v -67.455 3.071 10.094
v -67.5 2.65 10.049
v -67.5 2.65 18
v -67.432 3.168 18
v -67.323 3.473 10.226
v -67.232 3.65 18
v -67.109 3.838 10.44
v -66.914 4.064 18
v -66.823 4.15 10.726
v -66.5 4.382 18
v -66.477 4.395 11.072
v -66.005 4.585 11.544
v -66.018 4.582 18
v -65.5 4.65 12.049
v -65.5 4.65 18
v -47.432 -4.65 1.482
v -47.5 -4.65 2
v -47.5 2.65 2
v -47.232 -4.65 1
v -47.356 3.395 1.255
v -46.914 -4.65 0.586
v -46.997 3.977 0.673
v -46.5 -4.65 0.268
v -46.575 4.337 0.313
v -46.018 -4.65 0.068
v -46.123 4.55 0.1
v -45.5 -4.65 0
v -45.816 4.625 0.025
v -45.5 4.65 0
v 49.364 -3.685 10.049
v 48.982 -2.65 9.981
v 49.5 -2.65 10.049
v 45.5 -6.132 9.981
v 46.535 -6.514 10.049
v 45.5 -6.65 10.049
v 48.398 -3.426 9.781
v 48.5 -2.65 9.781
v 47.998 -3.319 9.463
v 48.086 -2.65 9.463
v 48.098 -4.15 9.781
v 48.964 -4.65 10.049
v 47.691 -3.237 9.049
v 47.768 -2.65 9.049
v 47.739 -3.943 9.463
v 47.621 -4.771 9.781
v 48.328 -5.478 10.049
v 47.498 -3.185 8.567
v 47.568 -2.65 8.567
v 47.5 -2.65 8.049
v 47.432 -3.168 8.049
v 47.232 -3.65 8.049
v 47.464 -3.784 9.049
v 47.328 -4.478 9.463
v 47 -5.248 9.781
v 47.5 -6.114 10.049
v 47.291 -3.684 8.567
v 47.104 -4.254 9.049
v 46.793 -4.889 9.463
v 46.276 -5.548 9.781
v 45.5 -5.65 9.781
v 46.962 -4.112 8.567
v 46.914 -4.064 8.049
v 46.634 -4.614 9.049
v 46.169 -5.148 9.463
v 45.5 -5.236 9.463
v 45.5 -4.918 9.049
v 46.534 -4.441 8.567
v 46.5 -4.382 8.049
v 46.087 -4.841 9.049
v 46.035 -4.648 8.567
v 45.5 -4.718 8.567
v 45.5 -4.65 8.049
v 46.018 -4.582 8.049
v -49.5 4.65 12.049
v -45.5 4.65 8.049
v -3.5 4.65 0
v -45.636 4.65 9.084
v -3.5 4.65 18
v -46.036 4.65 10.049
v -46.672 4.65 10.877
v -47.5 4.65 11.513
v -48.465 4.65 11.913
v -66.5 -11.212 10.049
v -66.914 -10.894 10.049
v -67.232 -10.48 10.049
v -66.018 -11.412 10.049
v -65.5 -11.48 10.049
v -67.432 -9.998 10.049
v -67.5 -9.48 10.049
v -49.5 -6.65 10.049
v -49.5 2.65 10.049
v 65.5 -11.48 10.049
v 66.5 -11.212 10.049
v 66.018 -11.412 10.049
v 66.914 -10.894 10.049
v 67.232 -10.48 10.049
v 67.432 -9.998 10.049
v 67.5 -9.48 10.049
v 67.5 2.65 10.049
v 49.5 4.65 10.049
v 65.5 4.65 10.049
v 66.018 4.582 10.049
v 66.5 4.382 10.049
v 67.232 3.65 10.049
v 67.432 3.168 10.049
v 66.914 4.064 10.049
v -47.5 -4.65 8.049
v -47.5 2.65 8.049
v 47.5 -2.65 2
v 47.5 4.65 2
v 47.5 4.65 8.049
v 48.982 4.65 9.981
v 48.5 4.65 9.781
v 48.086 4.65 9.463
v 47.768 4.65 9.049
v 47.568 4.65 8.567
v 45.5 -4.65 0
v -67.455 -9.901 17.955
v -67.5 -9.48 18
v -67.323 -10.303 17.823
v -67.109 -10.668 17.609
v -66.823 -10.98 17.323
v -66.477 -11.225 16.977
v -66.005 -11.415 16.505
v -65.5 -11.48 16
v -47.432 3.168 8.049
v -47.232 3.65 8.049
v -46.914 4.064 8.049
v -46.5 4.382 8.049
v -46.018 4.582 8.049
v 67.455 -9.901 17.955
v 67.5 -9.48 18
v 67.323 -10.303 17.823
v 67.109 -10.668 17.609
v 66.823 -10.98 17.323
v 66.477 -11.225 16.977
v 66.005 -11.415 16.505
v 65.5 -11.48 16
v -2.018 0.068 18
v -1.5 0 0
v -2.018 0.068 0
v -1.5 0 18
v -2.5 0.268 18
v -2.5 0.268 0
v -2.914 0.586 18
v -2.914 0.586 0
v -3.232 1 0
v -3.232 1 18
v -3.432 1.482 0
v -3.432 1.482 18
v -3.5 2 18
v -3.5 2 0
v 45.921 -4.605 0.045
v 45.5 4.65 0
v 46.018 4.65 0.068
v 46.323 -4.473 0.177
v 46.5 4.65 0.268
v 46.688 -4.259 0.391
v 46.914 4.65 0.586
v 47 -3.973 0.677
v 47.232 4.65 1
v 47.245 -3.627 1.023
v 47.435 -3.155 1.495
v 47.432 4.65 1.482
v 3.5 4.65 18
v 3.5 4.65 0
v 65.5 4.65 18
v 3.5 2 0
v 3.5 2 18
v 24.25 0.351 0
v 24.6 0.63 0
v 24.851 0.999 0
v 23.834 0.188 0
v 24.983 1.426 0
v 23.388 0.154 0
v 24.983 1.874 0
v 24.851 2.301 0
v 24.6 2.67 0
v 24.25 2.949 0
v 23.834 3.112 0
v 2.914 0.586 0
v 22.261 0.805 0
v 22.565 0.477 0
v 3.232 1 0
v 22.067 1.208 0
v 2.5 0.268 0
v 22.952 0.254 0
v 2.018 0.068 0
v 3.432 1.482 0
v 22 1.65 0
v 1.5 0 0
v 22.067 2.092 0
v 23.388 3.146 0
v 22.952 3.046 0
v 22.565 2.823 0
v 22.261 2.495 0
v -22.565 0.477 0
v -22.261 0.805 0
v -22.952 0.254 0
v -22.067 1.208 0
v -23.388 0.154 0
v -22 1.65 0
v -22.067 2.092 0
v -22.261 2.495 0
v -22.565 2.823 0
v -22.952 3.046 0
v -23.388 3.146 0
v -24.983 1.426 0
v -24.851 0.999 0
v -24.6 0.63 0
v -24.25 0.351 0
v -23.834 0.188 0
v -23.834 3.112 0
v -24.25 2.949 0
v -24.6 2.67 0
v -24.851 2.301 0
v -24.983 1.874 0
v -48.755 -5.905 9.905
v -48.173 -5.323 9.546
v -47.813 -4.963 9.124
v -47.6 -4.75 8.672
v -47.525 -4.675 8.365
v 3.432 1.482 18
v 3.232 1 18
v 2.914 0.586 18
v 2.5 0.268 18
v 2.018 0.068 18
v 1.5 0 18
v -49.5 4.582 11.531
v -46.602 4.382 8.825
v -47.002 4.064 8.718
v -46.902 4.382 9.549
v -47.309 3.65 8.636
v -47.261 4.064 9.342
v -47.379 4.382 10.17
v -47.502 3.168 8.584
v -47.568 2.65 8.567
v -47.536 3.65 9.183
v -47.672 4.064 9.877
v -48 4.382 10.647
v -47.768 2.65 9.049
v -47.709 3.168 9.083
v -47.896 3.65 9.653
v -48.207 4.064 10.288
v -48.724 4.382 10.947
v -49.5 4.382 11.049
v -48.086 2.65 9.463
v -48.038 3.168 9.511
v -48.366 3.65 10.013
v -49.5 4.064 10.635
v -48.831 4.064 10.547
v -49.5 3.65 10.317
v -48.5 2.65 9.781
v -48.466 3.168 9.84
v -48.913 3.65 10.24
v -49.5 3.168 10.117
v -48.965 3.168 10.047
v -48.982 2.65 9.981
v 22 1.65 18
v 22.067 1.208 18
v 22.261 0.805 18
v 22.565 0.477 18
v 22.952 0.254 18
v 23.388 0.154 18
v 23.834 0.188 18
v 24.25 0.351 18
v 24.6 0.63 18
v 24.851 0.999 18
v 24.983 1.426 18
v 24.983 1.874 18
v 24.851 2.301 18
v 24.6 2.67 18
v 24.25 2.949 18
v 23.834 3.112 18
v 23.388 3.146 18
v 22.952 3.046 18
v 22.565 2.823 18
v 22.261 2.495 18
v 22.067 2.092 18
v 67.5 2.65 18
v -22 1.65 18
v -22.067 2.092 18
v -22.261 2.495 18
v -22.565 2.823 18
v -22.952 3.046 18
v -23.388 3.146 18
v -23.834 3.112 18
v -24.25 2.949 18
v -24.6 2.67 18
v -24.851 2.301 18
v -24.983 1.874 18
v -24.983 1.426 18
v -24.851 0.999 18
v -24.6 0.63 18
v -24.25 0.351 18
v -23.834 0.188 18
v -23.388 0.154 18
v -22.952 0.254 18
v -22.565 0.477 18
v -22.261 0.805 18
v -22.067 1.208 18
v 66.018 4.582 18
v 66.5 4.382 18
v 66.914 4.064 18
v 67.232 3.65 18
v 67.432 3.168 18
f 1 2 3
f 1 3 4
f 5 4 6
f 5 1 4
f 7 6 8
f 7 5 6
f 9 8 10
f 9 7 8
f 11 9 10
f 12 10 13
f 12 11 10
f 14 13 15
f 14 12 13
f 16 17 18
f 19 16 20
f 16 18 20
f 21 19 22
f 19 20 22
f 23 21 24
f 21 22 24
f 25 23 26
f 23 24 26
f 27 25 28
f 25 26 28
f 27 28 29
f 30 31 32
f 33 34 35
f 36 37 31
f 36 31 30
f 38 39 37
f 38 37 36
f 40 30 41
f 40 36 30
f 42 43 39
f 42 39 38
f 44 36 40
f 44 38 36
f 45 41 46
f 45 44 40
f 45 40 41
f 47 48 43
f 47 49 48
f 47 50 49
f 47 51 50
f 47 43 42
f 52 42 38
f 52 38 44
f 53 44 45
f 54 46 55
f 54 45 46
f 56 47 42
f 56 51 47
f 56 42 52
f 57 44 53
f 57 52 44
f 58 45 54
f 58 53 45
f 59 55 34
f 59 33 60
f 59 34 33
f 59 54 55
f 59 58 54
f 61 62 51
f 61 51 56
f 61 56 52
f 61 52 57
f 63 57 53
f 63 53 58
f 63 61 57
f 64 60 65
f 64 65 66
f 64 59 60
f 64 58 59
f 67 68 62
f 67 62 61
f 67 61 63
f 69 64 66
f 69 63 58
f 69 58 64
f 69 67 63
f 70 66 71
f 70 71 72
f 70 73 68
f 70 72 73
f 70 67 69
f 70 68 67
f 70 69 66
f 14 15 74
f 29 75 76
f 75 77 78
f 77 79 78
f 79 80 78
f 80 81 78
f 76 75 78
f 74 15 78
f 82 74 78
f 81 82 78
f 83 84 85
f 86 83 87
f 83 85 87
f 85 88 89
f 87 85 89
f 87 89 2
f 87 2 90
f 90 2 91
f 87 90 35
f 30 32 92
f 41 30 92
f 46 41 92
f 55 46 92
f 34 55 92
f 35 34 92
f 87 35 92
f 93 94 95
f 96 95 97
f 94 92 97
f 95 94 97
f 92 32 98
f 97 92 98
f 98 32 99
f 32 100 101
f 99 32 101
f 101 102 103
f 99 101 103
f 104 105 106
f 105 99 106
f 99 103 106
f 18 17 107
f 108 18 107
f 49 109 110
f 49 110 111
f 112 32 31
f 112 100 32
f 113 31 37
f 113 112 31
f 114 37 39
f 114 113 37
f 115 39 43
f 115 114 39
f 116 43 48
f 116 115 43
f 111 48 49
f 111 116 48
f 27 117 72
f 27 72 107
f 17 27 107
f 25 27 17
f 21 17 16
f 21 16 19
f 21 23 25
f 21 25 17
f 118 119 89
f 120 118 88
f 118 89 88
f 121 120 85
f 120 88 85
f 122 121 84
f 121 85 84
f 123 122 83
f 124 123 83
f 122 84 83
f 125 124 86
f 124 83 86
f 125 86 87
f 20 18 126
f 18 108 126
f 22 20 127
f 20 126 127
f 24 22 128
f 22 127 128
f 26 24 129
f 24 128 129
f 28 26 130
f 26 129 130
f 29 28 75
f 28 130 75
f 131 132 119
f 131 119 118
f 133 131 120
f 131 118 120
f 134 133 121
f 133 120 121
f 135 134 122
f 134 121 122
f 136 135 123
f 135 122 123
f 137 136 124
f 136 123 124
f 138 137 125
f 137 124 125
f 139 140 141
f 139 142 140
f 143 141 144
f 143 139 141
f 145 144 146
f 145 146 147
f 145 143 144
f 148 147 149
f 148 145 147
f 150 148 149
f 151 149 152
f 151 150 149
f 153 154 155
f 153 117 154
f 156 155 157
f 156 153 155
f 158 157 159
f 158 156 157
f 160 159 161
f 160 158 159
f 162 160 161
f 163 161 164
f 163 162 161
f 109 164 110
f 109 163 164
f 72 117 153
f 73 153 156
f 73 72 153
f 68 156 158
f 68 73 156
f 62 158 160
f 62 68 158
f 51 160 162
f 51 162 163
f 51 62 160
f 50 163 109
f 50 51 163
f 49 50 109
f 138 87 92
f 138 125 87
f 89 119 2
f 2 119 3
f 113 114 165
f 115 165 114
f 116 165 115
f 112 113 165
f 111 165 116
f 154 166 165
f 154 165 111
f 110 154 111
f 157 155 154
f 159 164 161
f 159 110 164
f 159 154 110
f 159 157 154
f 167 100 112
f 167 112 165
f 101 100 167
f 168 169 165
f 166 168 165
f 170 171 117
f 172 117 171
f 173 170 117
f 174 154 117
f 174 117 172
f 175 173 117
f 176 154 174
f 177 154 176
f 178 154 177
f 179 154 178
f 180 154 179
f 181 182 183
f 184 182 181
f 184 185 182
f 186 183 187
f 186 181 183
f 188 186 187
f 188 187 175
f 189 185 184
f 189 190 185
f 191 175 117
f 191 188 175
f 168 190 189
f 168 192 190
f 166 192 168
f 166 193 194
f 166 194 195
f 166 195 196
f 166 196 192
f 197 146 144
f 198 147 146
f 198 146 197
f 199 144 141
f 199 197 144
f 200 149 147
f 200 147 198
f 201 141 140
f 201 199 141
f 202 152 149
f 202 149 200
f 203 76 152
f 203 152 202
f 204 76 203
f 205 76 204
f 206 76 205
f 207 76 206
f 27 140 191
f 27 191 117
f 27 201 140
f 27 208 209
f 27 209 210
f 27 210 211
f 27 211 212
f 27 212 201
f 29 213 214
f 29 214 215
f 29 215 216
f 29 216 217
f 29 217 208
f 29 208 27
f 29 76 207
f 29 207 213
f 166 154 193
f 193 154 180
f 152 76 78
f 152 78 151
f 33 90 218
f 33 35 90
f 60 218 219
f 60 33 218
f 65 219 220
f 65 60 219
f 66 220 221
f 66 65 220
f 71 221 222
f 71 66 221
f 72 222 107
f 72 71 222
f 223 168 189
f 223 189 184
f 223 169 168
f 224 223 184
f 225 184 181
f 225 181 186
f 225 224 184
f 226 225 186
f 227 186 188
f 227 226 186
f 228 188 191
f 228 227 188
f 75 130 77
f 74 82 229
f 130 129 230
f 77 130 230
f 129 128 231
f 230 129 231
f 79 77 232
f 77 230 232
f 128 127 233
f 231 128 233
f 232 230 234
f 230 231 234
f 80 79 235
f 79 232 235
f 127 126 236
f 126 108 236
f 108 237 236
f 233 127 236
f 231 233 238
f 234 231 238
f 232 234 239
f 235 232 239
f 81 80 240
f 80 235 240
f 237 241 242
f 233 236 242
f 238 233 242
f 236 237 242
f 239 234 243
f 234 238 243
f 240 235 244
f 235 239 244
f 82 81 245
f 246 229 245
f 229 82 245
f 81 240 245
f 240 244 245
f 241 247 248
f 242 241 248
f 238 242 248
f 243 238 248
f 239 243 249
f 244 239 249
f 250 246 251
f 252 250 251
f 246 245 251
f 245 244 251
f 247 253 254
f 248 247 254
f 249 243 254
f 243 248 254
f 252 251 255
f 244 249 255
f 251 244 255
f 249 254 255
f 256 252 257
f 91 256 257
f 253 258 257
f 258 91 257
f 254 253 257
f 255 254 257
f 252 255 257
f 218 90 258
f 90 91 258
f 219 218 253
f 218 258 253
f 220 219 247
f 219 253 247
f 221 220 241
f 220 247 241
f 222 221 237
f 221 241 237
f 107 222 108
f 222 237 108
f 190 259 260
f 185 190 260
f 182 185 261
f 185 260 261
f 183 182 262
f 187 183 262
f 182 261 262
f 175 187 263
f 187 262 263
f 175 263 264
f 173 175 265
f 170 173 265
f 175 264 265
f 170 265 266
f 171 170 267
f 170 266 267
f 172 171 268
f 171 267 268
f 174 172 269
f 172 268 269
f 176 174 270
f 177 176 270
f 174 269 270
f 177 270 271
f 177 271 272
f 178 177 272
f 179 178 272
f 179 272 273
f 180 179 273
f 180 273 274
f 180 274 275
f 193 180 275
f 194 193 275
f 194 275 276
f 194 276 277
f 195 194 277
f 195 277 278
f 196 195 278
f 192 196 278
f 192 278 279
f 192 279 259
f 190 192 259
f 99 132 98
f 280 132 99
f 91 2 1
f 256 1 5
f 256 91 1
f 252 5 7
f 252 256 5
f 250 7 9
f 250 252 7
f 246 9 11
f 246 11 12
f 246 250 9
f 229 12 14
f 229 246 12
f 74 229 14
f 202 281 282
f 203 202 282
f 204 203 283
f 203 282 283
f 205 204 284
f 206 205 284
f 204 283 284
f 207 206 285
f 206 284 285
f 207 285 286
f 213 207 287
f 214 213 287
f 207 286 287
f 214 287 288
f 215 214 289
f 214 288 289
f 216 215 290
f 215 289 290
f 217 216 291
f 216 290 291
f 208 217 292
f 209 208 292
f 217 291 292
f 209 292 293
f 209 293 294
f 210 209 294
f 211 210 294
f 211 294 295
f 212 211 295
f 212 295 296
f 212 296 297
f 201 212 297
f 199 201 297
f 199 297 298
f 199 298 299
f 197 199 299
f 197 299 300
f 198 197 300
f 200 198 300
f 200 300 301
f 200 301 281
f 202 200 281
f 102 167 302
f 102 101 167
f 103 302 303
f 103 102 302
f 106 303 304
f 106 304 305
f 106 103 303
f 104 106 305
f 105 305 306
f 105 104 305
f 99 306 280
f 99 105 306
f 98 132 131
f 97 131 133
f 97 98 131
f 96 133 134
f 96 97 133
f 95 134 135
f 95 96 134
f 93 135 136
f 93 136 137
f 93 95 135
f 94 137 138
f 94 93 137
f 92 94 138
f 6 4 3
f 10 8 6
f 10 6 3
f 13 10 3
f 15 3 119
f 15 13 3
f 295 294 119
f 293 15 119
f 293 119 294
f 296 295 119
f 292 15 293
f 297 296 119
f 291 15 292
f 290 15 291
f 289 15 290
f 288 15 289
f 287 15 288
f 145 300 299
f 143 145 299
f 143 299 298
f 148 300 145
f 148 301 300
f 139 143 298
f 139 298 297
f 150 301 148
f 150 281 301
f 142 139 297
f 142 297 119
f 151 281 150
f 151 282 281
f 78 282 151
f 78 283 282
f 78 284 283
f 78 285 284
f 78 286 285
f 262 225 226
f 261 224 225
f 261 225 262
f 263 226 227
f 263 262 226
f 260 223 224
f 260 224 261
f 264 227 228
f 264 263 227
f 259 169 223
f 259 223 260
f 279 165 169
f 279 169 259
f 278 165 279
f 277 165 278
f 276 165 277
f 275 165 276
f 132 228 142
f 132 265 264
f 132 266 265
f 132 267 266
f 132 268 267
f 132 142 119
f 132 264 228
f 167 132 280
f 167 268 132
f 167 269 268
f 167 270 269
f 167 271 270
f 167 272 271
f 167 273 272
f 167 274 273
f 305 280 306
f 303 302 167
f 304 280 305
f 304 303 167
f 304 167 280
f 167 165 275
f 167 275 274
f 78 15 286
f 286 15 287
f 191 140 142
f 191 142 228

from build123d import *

# Parameters (mm, degrees)
BOSS_EXTRU_1_DEPTH      = 18
ESQUISSE2_R             = 1.5
ENL_V_MAT_EXTRU_1_DEPTH = 52.008553204
ESQUISSE3_W             = 7.950993182
ESQUISSE3_H             = 6.830138408
BOSS_EXTRU_2_DEPTH      = 95
ESQUISSE4_W             = 20
ESQUISSE4_H             = 16.130138408
BOSS_EXTRU_3_DEPTH      = 7.950993182
CONG_1_R                = 2


with BuildPart() as part:
    # Esquisse1 → Boss.-Extru.1 (new body)
    with BuildSketch(Plane.XY):
        Polygon((-47.5, 4.65), (-3.5, 4.65), (-3.5, 0), (3.5, 0), (3.5, 4.65), (47.5, 4.65), (47.5, -4.65), (-47.5, -4.65), align=None)
    extrude(amount=BOSS_EXTRU_1_DEPTH)

    # Esquisse2 → Enlèv. mat.-Extru.1 (cut, through all)
    with BuildSketch(Plane.XY.offset(18)):
        with Locations((-23.5, 1.65)):
            Circle(ESQUISSE2_R)
        with Locations(Location((23.5, 1.65, 0), (0, 0, 180))):
            Circle(ESQUISSE2_R)
    extrude(amount=-ENL_V_MAT_EXTRU_1_DEPTH, mode=Mode.SUBTRACT)

    # Esquisse3 → Boss.-Extru.2 (add)
    with BuildSketch(Plane.ZY.offset(47.5)):
        with Locations((14.024503409, -8.065069204)):
            Rectangle(ESQUISSE3_W, ESQUISSE3_H)
    extrude(amount=-BOSS_EXTRU_2_DEPTH)

    # Esquisse4 → Boss.-Extru.3 (add)
    with BuildSketch(Plane.XY.offset(18)):
        with Locations((-57.5, -3.415069204)):
            Rectangle(ESQUISSE4_W, ESQUISSE4_H)
        with Locations((57.5, -3.415069204)):
            Rectangle(ESQUISSE4_W, ESQUISSE4_H)
    extrude(amount=-BOSS_EXTRU_3_DEPTH)

    # Congé1
    cong_1_edges = [part.edges().sort_by_distance(p)[0] for p in [
        (-47.5, 4.65, 5.024503409),
        (0, -4.65, 10.049006818),
        (0, -11.480138408, 18),
        (-3.5, 0, 9),
        (3.5, 0, 9),
        (-57.5, 4.65, 10.049006818),
        (47.5, -4.65, 5.024503409),
        (47.5, 0, 0),
        (-47.5, 0, 0),
        (47.5, 0, 10.049006818),
        (-47.5, 0, 10.049006818),
        (67.5, 4.65, 14.024503409),
        (67.5, -11.480138408, 14.024503409),
        (-67.5, 4.65, 14.024503409),
        (-67.5, -11.480138408, 14.024503409),
    ]]
    fillet(cong_1_edges, radius=CONG_1_R)


solid = part.part
